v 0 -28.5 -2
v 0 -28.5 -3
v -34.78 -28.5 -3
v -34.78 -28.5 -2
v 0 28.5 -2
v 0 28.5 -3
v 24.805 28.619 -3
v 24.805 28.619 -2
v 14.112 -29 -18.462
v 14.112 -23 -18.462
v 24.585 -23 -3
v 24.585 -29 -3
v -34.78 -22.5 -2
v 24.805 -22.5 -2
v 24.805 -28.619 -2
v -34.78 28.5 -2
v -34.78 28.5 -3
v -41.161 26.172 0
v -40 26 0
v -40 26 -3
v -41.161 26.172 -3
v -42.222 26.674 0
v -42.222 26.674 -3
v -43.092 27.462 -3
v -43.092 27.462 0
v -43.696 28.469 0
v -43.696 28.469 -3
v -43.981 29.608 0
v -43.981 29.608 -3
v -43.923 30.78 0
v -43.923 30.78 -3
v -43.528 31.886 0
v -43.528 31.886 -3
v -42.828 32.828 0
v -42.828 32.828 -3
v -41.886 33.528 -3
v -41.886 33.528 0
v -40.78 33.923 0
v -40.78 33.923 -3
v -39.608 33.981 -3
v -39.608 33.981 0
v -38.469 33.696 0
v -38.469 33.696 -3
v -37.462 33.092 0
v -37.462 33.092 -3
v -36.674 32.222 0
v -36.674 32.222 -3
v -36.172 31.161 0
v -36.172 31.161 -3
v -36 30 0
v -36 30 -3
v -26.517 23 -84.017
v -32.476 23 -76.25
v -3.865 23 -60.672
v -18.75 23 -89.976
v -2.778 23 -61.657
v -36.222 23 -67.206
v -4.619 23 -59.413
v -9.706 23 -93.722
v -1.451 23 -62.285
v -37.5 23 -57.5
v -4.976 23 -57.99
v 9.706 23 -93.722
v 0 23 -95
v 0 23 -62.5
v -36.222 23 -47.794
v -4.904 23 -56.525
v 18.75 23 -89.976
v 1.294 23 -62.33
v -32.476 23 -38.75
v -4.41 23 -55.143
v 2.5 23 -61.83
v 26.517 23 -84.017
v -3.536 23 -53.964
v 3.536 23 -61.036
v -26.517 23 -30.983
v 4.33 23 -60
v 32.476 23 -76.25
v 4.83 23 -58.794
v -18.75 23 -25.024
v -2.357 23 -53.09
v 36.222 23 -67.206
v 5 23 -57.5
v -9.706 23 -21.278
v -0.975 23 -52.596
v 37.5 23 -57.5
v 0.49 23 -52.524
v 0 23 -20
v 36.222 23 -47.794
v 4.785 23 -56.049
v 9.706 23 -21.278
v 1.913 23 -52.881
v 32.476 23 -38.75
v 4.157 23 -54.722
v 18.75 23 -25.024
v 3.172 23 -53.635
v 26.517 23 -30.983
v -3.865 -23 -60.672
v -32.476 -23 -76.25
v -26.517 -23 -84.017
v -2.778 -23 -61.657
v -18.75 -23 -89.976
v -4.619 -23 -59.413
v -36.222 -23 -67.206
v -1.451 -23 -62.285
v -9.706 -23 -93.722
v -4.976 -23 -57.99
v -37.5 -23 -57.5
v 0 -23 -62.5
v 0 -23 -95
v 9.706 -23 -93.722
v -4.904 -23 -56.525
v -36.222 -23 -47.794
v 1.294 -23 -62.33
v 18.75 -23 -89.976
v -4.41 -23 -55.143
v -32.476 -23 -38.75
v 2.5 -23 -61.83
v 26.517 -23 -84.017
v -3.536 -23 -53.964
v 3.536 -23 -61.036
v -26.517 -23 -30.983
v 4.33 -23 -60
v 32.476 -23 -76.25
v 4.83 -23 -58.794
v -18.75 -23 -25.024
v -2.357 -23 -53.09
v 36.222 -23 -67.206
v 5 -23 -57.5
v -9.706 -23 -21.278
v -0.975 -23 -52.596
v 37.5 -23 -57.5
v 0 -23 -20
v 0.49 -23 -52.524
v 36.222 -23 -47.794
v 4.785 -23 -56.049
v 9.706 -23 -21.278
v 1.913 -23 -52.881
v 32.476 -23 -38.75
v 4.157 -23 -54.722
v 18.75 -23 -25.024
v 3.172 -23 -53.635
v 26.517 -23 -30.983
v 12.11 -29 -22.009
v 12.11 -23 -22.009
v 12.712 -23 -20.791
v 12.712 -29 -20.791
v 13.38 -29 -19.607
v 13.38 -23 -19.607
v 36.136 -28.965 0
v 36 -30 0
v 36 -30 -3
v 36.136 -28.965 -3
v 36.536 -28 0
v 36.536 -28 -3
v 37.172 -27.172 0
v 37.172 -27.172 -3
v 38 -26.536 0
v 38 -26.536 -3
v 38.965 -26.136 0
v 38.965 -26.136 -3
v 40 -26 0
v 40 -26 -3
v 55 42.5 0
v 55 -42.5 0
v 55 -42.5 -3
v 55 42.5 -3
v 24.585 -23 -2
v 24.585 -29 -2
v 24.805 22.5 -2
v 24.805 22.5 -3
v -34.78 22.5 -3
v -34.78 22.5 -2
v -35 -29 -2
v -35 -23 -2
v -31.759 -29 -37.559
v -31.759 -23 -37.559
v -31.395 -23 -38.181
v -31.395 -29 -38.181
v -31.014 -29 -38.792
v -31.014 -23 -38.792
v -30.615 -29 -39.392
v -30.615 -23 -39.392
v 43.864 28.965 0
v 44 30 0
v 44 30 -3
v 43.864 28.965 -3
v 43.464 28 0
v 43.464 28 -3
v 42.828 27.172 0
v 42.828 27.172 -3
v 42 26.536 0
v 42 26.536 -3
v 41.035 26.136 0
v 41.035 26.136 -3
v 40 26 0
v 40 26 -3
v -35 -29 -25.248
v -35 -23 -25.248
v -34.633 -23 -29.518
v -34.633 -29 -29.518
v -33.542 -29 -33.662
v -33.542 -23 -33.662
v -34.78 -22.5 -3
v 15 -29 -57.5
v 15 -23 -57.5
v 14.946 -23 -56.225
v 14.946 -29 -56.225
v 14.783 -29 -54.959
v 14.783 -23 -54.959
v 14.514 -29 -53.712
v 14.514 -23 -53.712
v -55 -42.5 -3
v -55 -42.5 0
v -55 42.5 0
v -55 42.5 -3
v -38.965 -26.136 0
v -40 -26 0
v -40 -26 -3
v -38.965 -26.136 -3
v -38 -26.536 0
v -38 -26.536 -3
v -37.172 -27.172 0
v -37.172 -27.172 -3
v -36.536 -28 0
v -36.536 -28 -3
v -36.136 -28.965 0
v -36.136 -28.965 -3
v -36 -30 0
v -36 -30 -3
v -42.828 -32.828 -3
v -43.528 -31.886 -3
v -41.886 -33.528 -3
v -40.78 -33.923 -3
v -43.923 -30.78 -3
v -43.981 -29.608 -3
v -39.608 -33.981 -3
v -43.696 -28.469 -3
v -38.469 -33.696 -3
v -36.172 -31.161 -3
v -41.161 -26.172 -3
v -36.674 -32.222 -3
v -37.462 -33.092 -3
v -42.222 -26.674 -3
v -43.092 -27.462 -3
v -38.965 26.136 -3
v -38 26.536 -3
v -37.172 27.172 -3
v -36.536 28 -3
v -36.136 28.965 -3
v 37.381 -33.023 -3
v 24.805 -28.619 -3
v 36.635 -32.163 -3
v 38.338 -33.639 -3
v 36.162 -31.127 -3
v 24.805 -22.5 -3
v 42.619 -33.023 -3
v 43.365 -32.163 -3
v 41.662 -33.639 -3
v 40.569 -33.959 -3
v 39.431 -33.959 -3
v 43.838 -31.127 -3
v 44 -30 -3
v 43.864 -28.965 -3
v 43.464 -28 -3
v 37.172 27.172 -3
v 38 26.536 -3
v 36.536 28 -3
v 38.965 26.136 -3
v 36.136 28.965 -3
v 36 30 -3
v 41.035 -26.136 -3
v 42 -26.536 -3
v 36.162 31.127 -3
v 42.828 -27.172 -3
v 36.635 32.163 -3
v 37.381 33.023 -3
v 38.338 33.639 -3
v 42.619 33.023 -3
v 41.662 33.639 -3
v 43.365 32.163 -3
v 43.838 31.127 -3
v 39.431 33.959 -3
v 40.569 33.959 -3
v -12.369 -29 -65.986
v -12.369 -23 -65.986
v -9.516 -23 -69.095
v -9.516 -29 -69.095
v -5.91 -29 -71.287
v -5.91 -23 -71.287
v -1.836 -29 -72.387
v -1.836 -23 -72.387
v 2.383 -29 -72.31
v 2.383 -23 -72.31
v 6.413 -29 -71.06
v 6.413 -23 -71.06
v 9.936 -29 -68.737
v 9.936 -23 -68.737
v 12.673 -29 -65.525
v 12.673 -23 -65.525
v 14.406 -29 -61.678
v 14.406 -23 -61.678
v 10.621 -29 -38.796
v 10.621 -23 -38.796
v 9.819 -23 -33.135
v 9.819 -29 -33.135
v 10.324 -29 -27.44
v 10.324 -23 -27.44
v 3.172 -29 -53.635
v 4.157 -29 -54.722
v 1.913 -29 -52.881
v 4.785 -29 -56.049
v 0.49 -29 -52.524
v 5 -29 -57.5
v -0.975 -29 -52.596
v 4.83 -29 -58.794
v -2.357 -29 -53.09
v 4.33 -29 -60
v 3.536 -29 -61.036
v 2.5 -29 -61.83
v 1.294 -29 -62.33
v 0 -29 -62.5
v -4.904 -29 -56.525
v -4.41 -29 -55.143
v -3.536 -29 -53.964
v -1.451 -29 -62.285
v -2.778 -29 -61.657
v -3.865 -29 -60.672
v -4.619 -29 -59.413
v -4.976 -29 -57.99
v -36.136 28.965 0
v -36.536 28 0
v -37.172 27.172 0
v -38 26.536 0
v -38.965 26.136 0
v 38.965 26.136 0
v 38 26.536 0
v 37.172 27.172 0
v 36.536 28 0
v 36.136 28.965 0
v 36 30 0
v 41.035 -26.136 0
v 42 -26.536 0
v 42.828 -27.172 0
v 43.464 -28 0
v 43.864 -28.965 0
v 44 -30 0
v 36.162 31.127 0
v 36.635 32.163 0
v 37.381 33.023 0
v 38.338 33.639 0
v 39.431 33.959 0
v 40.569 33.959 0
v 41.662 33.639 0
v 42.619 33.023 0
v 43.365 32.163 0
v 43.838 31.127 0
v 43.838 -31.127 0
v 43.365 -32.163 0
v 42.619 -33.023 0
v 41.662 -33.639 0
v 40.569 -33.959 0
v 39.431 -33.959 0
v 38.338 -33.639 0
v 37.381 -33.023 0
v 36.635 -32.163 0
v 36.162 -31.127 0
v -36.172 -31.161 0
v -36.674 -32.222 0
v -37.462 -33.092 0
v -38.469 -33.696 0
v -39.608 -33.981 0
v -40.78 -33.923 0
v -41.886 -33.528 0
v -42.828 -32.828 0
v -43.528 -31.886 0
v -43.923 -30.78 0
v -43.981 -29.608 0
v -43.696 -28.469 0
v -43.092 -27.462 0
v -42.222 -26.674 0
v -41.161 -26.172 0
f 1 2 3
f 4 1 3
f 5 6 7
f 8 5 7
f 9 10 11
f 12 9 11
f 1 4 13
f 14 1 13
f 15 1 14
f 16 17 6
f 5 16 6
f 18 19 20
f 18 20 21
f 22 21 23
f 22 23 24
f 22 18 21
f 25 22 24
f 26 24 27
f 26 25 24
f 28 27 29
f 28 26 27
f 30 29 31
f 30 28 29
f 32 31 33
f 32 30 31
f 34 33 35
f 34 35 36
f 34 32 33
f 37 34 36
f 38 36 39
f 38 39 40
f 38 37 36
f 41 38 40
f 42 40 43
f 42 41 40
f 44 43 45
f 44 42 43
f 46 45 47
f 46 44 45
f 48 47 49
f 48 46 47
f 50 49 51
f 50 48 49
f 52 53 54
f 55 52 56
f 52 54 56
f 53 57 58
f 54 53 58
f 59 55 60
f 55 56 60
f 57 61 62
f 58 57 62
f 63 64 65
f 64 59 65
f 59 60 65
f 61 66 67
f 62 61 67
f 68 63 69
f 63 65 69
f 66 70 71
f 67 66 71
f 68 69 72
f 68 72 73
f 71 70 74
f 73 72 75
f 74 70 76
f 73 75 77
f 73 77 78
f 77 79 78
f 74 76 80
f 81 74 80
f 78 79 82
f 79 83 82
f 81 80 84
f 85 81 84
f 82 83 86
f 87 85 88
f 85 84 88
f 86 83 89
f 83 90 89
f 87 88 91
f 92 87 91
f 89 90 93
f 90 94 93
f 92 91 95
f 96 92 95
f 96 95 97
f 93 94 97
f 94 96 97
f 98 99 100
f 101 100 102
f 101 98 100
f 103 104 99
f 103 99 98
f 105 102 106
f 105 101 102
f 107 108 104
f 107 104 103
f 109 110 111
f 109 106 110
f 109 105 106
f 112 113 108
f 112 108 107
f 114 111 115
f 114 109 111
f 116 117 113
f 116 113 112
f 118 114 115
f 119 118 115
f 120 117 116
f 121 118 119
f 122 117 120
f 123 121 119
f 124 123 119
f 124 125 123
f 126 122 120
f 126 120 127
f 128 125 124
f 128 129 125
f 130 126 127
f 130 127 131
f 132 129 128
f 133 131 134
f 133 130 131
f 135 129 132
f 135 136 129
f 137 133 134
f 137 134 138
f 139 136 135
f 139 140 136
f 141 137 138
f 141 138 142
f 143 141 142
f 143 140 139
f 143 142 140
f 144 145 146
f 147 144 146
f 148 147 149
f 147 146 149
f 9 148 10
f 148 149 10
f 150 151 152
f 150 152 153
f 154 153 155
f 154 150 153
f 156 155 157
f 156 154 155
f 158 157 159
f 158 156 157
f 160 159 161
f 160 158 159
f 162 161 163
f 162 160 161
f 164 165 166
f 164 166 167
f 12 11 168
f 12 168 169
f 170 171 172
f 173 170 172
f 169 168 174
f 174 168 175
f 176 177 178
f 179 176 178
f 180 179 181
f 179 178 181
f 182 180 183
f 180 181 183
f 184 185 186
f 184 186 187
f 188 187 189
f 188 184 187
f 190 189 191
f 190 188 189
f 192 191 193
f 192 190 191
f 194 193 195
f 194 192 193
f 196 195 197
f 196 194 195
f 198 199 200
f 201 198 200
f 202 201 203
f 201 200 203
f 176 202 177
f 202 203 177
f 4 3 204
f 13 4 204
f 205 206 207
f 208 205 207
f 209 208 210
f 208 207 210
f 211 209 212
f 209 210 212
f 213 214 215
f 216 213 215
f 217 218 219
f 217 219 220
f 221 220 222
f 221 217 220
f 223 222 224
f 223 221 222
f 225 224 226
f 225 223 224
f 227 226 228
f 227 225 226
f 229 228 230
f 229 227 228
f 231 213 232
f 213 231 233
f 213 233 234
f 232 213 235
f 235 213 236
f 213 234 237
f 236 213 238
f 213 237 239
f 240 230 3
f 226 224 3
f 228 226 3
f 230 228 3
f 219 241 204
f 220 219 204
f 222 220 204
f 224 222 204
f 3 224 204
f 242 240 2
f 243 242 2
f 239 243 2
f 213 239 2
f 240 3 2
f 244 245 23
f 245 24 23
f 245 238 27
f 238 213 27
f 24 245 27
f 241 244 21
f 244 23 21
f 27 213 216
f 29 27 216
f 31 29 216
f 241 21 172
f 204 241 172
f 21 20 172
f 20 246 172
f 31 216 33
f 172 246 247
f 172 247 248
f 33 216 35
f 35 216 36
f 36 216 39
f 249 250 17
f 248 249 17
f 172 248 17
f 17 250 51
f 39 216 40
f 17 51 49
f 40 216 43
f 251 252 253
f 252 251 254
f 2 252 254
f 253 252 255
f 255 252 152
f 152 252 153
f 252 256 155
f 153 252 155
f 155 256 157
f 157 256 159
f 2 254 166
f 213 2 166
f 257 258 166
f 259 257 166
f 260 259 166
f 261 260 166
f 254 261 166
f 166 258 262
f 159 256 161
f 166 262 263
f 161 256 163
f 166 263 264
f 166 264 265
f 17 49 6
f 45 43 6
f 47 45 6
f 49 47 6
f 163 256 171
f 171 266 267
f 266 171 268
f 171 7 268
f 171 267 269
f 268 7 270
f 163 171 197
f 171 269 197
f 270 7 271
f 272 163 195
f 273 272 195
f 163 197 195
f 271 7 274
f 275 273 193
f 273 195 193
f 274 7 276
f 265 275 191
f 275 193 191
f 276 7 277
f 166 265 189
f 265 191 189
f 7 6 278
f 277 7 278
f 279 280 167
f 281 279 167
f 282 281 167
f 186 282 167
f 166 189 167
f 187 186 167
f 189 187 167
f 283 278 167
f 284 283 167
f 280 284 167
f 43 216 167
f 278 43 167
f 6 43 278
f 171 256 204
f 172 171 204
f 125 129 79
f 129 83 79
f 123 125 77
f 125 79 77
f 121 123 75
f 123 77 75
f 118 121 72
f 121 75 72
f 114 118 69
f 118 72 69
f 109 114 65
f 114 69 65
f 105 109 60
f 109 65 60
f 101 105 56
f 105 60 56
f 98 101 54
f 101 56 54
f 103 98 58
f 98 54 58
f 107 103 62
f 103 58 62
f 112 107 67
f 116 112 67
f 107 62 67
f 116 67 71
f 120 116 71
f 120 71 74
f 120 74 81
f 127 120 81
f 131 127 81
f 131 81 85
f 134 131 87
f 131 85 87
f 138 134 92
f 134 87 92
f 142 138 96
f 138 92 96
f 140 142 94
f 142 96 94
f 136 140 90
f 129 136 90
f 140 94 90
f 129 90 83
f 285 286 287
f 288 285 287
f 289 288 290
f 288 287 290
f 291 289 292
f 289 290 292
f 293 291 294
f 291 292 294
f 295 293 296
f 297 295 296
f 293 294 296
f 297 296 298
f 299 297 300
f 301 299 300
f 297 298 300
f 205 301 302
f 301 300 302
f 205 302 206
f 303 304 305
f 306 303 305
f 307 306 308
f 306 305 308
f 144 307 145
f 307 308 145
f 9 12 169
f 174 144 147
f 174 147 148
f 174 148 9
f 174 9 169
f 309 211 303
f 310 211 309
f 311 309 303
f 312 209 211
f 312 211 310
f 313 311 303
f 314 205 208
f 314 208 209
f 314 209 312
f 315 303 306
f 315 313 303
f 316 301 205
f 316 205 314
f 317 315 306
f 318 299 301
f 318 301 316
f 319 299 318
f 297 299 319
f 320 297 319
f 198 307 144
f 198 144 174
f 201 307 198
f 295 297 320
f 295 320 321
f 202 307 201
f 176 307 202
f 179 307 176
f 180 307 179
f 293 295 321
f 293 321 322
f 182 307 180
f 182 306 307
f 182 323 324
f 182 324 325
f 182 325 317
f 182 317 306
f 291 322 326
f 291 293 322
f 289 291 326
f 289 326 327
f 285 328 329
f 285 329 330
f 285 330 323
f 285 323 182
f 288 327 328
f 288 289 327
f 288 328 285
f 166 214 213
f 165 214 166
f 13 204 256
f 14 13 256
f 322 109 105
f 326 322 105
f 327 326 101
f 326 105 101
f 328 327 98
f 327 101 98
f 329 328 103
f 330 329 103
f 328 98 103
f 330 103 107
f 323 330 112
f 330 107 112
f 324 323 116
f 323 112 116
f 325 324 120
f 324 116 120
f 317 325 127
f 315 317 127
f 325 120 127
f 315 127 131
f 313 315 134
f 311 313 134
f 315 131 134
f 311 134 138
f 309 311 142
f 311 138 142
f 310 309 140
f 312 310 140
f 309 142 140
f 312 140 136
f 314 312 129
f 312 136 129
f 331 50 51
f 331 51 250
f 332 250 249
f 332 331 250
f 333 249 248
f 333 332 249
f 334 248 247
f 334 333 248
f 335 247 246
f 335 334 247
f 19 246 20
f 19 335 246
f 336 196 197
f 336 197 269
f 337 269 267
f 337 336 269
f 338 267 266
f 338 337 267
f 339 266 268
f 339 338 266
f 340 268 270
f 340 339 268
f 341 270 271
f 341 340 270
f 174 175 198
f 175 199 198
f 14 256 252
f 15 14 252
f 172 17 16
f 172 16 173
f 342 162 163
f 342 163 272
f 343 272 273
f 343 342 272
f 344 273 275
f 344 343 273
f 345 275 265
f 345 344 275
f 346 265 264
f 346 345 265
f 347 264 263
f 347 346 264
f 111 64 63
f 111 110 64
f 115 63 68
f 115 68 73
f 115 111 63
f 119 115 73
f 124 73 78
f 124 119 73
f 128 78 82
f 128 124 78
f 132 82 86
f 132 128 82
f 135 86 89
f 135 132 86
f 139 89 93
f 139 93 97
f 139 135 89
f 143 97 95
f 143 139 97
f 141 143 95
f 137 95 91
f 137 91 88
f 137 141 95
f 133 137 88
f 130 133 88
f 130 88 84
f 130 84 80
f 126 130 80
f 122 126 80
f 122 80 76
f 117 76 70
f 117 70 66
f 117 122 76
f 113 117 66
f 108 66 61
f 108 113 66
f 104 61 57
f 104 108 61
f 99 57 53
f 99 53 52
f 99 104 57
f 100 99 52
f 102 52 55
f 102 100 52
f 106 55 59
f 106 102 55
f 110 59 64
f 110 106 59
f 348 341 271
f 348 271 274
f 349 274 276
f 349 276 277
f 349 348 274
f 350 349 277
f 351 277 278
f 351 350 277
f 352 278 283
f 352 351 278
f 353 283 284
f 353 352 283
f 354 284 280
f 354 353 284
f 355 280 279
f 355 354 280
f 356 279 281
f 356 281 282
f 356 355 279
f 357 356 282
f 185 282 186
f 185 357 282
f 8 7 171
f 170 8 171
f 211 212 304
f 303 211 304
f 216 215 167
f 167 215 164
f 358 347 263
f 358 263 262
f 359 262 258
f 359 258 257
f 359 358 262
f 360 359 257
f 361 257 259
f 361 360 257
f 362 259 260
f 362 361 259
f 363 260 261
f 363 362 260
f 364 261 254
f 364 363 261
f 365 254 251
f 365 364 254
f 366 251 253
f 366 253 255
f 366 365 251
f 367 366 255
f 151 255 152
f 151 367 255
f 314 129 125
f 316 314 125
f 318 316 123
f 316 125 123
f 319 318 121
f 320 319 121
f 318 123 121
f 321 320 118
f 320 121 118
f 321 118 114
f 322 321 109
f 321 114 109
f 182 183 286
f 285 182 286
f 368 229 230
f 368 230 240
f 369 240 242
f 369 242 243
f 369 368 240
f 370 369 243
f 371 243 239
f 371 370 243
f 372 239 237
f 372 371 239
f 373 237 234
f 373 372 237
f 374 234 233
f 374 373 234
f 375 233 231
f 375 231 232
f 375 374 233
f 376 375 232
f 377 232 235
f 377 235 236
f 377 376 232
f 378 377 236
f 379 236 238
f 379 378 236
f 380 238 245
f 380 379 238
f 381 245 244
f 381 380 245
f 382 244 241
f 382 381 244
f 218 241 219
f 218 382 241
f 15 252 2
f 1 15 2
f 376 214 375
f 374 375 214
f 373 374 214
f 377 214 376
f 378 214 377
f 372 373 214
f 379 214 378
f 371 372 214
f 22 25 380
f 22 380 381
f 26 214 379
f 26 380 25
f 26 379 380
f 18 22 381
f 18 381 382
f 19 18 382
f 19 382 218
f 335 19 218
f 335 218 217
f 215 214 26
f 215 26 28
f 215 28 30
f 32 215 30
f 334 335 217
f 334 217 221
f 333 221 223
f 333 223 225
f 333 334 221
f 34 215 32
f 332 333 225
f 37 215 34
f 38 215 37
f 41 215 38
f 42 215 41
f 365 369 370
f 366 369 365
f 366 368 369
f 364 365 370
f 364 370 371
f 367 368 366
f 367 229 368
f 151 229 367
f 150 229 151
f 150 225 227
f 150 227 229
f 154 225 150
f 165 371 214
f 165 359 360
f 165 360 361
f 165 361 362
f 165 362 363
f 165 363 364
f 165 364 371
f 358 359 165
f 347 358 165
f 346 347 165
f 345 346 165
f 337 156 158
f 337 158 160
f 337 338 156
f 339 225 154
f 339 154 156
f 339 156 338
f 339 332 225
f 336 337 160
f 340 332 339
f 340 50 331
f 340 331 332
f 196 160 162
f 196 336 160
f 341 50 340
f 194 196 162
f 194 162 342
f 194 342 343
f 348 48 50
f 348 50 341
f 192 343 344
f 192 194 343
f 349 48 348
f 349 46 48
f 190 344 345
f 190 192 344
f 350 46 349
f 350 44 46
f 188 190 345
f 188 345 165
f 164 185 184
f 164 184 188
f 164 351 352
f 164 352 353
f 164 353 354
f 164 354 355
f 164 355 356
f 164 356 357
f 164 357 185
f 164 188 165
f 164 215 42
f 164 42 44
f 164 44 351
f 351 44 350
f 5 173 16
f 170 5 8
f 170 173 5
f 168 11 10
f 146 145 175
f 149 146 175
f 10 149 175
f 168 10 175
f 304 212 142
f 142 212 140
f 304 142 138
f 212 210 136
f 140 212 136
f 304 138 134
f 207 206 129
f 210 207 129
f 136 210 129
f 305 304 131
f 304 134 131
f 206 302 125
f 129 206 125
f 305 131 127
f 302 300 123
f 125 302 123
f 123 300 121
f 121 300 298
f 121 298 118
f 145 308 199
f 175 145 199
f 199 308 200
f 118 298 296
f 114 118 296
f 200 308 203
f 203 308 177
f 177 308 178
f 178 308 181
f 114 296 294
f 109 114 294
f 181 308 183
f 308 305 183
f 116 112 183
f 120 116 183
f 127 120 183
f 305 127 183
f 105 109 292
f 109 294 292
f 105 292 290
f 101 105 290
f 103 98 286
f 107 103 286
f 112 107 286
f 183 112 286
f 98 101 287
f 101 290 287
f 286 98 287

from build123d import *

# Parameters (mm, degrees)
F1_DEPTH = 23
F2_W     = 110
F2_H     = 85
F3_DEPTH = 3
F5_DEPTH = 6
F6_W     = 34.7799539885
F6_H     = 6
F7_DEPTH = 1
F8_DEPTH = 1


with BuildPart() as f1:
    # F0 (on Front) → F1 (new body, symmetric)
    with BuildSketch(Plane.XZ):
        with BuildLine():
            ThreePointArc((37.5, -57.5), (-26.5165042945, -30.9834957055), (0, -95))
            ThreePointArc((0, -95), (26.5165042945, -84.0165042945), (37.5, -57.5))
        make_face()
        with BuildLine():
            ThreePointArc((5, -57.5), (3.5355339059, -61.0355339059), (0, -62.5))
            ThreePointArc((0, -62.5), (-3.5355339059, -53.9644660941), (5, -57.5))
        make_face(mode=Mode.SUBTRACT)
    extrude(amount=F1_DEPTH, both=True)


with BuildPart() as f3:
    # F2 (on Top) → F3 (new body)
    with BuildSketch(Plane.XY):
        Rectangle(F2_W, F2_H)
        with BuildLine():
            Line((36, -30), (-36, -30))
            ThreePointArc((-36, -30), (-42.8284271247, -32.8284271247), (-40, -26))
            Line((-40, -26), (-40, 26))
            ThreePointArc((-40, 26), (-42.8284271247, 32.8284271247), (-36, 30))
            Line((-36, 30), (36, 30))
            ThreePointArc((36, 30), (40, 34), (44, 30))
            ThreePointArc((44, 30), (42.8284271247, 27.1715728753), (40, 26))
            Line((40, 26), (40, -26))
            ThreePointArc((40, -26), (42.8284271247, -27.1715728753), (44, -30))
            ThreePointArc((44, -30), (40, -34), (36, -30))
        make_face(mode=Mode.SUBTRACT)
        with BuildLine():
            ThreePointArc((-40, -26), (-37.1715728753, -27.1715728753), (-36, -30))
            Line((-36, -30), (36, -30))
            ThreePointArc((36, -30), (37.1715728753, -27.1715728753), (40, -26))
            Line((40, -26), (40, 26))
            ThreePointArc((40, 26), (37.1715728753, 27.1715728753), (36, 30))
            Line((36, 30), (-36, 30))
            ThreePointArc((-36, 30), (-37.1715728753, 27.1715728753), (-40, 26))
            Line((-40, 26), (-40, -26))
        make_face()
    extrude(amount=-F3_DEPTH)

    # F6 (on face) → F7 (cut)
    with BuildSketch(Plane(origin=(0, 0, -3), x_dir=(1, 0, 0), z_dir=(0, 0, -1))):
        Polygon((24.8050460115, -22.5), (0, -22.5), (0, -28.5), (24.8050460115, -28.6190058787), align=None)
        with Locations((-17.3899769943, -25.5)):
            Rectangle(F6_W, F6_H)
        Polygon((0, 22.5), (24.8050460115, 22.5), (24.8050460115, 28.6190058787), (0, 28.5), (-34.7799539885, 28.5), (-34.7799539885, 22.5), align=None)
    extrude(amount=-F7_DEPTH, mode=Mode.SUBTRACT)


with BuildPart() as f5:
    # F4 (on face) → F5 (new body)
    with BuildSketch(Plane.XZ.offset(23)):
        with BuildLine():
            ThreePointArc((-31.7587456306, -37.5592859714), (-12.5289492083, -22.1549093687), (12.1096103032, -22.0090527274))
            ThreePointArc((12.1096103032, -22.0090527274), (13.0382727302, -20.194540616), (14.1116697761, -18.4617143444))
            Line((14.1116697761, -18.4617143444), (24.5849639177, -3))
            Line((24.5849639177, -3), (0, -3))
            Line((0, -3), (-35, -3))
            Line((-35, -3), (-35, -25.248437561))
            ThreePointArc((-35, -25.248437561), (-34.1761105305, -31.6136303796), (-31.7587456306, -37.5592859714))
        make_face()
        with BuildLine():
            ThreePointArc((-12.3687979141, -65.9860378364), (-6.2301711882, -43.8550387701), (14.5137450016, -53.7117014336))
            Line((14.5137450016, -53.7117014336), (10.6205409153, -38.7960419739))
            ThreePointArc((10.6205409153, -38.7960419739), (9.9078937869, -30.273289816), (12.1096103032, -22.0090527274))
            ThreePointArc((12.1096103032, -22.0090527274), (-12.5289492083, -22.1549093687), (-31.7587456306, -37.5592859714))
            ThreePointArc((-31.7587456306, -37.5592859714), (-31.2065084773, -38.4879238879), (-30.6146631901, -39.3918339551))
            Line((-30.6146631901, -39.3918339551), (-12.3687979141, -65.9860378364))
        make_face()
        with BuildLine():
            ThreePointArc((-12.3687979141, -65.9860378364), (4.4422984641, -71.8271066289), (15, -57.5))
            ThreePointArc((15, -57.5), (14.8779396259, -55.5903108924), (14.5137450016, -53.7117014336))
            ThreePointArc((14.5137450016, -53.7117014336), (-6.2301711882, -43.8550387701), (-12.3687979141, -65.9860378364))
        make_face()
        with BuildLine():
            ThreePointArc((0, -62.5), (-3.5355339059, -53.9644660941), (5, -57.5))
            ThreePointArc((5, -57.5), (3.5355339059, -61.0355339059), (0, -62.5))
        make_face(mode=Mode.SUBTRACT)
    extrude(amount=F5_DEPTH)

    # F8 (add): a face of the model
    f8_faces = [f5.faces().sort_by_distance(p)[0] for p in [
        (-5.2075180411, -26, -3),
    ]]
    extrude(f8_faces, amount=F8_DEPTH)


solid = Compound([f1.part, f3.part, f5.part])
